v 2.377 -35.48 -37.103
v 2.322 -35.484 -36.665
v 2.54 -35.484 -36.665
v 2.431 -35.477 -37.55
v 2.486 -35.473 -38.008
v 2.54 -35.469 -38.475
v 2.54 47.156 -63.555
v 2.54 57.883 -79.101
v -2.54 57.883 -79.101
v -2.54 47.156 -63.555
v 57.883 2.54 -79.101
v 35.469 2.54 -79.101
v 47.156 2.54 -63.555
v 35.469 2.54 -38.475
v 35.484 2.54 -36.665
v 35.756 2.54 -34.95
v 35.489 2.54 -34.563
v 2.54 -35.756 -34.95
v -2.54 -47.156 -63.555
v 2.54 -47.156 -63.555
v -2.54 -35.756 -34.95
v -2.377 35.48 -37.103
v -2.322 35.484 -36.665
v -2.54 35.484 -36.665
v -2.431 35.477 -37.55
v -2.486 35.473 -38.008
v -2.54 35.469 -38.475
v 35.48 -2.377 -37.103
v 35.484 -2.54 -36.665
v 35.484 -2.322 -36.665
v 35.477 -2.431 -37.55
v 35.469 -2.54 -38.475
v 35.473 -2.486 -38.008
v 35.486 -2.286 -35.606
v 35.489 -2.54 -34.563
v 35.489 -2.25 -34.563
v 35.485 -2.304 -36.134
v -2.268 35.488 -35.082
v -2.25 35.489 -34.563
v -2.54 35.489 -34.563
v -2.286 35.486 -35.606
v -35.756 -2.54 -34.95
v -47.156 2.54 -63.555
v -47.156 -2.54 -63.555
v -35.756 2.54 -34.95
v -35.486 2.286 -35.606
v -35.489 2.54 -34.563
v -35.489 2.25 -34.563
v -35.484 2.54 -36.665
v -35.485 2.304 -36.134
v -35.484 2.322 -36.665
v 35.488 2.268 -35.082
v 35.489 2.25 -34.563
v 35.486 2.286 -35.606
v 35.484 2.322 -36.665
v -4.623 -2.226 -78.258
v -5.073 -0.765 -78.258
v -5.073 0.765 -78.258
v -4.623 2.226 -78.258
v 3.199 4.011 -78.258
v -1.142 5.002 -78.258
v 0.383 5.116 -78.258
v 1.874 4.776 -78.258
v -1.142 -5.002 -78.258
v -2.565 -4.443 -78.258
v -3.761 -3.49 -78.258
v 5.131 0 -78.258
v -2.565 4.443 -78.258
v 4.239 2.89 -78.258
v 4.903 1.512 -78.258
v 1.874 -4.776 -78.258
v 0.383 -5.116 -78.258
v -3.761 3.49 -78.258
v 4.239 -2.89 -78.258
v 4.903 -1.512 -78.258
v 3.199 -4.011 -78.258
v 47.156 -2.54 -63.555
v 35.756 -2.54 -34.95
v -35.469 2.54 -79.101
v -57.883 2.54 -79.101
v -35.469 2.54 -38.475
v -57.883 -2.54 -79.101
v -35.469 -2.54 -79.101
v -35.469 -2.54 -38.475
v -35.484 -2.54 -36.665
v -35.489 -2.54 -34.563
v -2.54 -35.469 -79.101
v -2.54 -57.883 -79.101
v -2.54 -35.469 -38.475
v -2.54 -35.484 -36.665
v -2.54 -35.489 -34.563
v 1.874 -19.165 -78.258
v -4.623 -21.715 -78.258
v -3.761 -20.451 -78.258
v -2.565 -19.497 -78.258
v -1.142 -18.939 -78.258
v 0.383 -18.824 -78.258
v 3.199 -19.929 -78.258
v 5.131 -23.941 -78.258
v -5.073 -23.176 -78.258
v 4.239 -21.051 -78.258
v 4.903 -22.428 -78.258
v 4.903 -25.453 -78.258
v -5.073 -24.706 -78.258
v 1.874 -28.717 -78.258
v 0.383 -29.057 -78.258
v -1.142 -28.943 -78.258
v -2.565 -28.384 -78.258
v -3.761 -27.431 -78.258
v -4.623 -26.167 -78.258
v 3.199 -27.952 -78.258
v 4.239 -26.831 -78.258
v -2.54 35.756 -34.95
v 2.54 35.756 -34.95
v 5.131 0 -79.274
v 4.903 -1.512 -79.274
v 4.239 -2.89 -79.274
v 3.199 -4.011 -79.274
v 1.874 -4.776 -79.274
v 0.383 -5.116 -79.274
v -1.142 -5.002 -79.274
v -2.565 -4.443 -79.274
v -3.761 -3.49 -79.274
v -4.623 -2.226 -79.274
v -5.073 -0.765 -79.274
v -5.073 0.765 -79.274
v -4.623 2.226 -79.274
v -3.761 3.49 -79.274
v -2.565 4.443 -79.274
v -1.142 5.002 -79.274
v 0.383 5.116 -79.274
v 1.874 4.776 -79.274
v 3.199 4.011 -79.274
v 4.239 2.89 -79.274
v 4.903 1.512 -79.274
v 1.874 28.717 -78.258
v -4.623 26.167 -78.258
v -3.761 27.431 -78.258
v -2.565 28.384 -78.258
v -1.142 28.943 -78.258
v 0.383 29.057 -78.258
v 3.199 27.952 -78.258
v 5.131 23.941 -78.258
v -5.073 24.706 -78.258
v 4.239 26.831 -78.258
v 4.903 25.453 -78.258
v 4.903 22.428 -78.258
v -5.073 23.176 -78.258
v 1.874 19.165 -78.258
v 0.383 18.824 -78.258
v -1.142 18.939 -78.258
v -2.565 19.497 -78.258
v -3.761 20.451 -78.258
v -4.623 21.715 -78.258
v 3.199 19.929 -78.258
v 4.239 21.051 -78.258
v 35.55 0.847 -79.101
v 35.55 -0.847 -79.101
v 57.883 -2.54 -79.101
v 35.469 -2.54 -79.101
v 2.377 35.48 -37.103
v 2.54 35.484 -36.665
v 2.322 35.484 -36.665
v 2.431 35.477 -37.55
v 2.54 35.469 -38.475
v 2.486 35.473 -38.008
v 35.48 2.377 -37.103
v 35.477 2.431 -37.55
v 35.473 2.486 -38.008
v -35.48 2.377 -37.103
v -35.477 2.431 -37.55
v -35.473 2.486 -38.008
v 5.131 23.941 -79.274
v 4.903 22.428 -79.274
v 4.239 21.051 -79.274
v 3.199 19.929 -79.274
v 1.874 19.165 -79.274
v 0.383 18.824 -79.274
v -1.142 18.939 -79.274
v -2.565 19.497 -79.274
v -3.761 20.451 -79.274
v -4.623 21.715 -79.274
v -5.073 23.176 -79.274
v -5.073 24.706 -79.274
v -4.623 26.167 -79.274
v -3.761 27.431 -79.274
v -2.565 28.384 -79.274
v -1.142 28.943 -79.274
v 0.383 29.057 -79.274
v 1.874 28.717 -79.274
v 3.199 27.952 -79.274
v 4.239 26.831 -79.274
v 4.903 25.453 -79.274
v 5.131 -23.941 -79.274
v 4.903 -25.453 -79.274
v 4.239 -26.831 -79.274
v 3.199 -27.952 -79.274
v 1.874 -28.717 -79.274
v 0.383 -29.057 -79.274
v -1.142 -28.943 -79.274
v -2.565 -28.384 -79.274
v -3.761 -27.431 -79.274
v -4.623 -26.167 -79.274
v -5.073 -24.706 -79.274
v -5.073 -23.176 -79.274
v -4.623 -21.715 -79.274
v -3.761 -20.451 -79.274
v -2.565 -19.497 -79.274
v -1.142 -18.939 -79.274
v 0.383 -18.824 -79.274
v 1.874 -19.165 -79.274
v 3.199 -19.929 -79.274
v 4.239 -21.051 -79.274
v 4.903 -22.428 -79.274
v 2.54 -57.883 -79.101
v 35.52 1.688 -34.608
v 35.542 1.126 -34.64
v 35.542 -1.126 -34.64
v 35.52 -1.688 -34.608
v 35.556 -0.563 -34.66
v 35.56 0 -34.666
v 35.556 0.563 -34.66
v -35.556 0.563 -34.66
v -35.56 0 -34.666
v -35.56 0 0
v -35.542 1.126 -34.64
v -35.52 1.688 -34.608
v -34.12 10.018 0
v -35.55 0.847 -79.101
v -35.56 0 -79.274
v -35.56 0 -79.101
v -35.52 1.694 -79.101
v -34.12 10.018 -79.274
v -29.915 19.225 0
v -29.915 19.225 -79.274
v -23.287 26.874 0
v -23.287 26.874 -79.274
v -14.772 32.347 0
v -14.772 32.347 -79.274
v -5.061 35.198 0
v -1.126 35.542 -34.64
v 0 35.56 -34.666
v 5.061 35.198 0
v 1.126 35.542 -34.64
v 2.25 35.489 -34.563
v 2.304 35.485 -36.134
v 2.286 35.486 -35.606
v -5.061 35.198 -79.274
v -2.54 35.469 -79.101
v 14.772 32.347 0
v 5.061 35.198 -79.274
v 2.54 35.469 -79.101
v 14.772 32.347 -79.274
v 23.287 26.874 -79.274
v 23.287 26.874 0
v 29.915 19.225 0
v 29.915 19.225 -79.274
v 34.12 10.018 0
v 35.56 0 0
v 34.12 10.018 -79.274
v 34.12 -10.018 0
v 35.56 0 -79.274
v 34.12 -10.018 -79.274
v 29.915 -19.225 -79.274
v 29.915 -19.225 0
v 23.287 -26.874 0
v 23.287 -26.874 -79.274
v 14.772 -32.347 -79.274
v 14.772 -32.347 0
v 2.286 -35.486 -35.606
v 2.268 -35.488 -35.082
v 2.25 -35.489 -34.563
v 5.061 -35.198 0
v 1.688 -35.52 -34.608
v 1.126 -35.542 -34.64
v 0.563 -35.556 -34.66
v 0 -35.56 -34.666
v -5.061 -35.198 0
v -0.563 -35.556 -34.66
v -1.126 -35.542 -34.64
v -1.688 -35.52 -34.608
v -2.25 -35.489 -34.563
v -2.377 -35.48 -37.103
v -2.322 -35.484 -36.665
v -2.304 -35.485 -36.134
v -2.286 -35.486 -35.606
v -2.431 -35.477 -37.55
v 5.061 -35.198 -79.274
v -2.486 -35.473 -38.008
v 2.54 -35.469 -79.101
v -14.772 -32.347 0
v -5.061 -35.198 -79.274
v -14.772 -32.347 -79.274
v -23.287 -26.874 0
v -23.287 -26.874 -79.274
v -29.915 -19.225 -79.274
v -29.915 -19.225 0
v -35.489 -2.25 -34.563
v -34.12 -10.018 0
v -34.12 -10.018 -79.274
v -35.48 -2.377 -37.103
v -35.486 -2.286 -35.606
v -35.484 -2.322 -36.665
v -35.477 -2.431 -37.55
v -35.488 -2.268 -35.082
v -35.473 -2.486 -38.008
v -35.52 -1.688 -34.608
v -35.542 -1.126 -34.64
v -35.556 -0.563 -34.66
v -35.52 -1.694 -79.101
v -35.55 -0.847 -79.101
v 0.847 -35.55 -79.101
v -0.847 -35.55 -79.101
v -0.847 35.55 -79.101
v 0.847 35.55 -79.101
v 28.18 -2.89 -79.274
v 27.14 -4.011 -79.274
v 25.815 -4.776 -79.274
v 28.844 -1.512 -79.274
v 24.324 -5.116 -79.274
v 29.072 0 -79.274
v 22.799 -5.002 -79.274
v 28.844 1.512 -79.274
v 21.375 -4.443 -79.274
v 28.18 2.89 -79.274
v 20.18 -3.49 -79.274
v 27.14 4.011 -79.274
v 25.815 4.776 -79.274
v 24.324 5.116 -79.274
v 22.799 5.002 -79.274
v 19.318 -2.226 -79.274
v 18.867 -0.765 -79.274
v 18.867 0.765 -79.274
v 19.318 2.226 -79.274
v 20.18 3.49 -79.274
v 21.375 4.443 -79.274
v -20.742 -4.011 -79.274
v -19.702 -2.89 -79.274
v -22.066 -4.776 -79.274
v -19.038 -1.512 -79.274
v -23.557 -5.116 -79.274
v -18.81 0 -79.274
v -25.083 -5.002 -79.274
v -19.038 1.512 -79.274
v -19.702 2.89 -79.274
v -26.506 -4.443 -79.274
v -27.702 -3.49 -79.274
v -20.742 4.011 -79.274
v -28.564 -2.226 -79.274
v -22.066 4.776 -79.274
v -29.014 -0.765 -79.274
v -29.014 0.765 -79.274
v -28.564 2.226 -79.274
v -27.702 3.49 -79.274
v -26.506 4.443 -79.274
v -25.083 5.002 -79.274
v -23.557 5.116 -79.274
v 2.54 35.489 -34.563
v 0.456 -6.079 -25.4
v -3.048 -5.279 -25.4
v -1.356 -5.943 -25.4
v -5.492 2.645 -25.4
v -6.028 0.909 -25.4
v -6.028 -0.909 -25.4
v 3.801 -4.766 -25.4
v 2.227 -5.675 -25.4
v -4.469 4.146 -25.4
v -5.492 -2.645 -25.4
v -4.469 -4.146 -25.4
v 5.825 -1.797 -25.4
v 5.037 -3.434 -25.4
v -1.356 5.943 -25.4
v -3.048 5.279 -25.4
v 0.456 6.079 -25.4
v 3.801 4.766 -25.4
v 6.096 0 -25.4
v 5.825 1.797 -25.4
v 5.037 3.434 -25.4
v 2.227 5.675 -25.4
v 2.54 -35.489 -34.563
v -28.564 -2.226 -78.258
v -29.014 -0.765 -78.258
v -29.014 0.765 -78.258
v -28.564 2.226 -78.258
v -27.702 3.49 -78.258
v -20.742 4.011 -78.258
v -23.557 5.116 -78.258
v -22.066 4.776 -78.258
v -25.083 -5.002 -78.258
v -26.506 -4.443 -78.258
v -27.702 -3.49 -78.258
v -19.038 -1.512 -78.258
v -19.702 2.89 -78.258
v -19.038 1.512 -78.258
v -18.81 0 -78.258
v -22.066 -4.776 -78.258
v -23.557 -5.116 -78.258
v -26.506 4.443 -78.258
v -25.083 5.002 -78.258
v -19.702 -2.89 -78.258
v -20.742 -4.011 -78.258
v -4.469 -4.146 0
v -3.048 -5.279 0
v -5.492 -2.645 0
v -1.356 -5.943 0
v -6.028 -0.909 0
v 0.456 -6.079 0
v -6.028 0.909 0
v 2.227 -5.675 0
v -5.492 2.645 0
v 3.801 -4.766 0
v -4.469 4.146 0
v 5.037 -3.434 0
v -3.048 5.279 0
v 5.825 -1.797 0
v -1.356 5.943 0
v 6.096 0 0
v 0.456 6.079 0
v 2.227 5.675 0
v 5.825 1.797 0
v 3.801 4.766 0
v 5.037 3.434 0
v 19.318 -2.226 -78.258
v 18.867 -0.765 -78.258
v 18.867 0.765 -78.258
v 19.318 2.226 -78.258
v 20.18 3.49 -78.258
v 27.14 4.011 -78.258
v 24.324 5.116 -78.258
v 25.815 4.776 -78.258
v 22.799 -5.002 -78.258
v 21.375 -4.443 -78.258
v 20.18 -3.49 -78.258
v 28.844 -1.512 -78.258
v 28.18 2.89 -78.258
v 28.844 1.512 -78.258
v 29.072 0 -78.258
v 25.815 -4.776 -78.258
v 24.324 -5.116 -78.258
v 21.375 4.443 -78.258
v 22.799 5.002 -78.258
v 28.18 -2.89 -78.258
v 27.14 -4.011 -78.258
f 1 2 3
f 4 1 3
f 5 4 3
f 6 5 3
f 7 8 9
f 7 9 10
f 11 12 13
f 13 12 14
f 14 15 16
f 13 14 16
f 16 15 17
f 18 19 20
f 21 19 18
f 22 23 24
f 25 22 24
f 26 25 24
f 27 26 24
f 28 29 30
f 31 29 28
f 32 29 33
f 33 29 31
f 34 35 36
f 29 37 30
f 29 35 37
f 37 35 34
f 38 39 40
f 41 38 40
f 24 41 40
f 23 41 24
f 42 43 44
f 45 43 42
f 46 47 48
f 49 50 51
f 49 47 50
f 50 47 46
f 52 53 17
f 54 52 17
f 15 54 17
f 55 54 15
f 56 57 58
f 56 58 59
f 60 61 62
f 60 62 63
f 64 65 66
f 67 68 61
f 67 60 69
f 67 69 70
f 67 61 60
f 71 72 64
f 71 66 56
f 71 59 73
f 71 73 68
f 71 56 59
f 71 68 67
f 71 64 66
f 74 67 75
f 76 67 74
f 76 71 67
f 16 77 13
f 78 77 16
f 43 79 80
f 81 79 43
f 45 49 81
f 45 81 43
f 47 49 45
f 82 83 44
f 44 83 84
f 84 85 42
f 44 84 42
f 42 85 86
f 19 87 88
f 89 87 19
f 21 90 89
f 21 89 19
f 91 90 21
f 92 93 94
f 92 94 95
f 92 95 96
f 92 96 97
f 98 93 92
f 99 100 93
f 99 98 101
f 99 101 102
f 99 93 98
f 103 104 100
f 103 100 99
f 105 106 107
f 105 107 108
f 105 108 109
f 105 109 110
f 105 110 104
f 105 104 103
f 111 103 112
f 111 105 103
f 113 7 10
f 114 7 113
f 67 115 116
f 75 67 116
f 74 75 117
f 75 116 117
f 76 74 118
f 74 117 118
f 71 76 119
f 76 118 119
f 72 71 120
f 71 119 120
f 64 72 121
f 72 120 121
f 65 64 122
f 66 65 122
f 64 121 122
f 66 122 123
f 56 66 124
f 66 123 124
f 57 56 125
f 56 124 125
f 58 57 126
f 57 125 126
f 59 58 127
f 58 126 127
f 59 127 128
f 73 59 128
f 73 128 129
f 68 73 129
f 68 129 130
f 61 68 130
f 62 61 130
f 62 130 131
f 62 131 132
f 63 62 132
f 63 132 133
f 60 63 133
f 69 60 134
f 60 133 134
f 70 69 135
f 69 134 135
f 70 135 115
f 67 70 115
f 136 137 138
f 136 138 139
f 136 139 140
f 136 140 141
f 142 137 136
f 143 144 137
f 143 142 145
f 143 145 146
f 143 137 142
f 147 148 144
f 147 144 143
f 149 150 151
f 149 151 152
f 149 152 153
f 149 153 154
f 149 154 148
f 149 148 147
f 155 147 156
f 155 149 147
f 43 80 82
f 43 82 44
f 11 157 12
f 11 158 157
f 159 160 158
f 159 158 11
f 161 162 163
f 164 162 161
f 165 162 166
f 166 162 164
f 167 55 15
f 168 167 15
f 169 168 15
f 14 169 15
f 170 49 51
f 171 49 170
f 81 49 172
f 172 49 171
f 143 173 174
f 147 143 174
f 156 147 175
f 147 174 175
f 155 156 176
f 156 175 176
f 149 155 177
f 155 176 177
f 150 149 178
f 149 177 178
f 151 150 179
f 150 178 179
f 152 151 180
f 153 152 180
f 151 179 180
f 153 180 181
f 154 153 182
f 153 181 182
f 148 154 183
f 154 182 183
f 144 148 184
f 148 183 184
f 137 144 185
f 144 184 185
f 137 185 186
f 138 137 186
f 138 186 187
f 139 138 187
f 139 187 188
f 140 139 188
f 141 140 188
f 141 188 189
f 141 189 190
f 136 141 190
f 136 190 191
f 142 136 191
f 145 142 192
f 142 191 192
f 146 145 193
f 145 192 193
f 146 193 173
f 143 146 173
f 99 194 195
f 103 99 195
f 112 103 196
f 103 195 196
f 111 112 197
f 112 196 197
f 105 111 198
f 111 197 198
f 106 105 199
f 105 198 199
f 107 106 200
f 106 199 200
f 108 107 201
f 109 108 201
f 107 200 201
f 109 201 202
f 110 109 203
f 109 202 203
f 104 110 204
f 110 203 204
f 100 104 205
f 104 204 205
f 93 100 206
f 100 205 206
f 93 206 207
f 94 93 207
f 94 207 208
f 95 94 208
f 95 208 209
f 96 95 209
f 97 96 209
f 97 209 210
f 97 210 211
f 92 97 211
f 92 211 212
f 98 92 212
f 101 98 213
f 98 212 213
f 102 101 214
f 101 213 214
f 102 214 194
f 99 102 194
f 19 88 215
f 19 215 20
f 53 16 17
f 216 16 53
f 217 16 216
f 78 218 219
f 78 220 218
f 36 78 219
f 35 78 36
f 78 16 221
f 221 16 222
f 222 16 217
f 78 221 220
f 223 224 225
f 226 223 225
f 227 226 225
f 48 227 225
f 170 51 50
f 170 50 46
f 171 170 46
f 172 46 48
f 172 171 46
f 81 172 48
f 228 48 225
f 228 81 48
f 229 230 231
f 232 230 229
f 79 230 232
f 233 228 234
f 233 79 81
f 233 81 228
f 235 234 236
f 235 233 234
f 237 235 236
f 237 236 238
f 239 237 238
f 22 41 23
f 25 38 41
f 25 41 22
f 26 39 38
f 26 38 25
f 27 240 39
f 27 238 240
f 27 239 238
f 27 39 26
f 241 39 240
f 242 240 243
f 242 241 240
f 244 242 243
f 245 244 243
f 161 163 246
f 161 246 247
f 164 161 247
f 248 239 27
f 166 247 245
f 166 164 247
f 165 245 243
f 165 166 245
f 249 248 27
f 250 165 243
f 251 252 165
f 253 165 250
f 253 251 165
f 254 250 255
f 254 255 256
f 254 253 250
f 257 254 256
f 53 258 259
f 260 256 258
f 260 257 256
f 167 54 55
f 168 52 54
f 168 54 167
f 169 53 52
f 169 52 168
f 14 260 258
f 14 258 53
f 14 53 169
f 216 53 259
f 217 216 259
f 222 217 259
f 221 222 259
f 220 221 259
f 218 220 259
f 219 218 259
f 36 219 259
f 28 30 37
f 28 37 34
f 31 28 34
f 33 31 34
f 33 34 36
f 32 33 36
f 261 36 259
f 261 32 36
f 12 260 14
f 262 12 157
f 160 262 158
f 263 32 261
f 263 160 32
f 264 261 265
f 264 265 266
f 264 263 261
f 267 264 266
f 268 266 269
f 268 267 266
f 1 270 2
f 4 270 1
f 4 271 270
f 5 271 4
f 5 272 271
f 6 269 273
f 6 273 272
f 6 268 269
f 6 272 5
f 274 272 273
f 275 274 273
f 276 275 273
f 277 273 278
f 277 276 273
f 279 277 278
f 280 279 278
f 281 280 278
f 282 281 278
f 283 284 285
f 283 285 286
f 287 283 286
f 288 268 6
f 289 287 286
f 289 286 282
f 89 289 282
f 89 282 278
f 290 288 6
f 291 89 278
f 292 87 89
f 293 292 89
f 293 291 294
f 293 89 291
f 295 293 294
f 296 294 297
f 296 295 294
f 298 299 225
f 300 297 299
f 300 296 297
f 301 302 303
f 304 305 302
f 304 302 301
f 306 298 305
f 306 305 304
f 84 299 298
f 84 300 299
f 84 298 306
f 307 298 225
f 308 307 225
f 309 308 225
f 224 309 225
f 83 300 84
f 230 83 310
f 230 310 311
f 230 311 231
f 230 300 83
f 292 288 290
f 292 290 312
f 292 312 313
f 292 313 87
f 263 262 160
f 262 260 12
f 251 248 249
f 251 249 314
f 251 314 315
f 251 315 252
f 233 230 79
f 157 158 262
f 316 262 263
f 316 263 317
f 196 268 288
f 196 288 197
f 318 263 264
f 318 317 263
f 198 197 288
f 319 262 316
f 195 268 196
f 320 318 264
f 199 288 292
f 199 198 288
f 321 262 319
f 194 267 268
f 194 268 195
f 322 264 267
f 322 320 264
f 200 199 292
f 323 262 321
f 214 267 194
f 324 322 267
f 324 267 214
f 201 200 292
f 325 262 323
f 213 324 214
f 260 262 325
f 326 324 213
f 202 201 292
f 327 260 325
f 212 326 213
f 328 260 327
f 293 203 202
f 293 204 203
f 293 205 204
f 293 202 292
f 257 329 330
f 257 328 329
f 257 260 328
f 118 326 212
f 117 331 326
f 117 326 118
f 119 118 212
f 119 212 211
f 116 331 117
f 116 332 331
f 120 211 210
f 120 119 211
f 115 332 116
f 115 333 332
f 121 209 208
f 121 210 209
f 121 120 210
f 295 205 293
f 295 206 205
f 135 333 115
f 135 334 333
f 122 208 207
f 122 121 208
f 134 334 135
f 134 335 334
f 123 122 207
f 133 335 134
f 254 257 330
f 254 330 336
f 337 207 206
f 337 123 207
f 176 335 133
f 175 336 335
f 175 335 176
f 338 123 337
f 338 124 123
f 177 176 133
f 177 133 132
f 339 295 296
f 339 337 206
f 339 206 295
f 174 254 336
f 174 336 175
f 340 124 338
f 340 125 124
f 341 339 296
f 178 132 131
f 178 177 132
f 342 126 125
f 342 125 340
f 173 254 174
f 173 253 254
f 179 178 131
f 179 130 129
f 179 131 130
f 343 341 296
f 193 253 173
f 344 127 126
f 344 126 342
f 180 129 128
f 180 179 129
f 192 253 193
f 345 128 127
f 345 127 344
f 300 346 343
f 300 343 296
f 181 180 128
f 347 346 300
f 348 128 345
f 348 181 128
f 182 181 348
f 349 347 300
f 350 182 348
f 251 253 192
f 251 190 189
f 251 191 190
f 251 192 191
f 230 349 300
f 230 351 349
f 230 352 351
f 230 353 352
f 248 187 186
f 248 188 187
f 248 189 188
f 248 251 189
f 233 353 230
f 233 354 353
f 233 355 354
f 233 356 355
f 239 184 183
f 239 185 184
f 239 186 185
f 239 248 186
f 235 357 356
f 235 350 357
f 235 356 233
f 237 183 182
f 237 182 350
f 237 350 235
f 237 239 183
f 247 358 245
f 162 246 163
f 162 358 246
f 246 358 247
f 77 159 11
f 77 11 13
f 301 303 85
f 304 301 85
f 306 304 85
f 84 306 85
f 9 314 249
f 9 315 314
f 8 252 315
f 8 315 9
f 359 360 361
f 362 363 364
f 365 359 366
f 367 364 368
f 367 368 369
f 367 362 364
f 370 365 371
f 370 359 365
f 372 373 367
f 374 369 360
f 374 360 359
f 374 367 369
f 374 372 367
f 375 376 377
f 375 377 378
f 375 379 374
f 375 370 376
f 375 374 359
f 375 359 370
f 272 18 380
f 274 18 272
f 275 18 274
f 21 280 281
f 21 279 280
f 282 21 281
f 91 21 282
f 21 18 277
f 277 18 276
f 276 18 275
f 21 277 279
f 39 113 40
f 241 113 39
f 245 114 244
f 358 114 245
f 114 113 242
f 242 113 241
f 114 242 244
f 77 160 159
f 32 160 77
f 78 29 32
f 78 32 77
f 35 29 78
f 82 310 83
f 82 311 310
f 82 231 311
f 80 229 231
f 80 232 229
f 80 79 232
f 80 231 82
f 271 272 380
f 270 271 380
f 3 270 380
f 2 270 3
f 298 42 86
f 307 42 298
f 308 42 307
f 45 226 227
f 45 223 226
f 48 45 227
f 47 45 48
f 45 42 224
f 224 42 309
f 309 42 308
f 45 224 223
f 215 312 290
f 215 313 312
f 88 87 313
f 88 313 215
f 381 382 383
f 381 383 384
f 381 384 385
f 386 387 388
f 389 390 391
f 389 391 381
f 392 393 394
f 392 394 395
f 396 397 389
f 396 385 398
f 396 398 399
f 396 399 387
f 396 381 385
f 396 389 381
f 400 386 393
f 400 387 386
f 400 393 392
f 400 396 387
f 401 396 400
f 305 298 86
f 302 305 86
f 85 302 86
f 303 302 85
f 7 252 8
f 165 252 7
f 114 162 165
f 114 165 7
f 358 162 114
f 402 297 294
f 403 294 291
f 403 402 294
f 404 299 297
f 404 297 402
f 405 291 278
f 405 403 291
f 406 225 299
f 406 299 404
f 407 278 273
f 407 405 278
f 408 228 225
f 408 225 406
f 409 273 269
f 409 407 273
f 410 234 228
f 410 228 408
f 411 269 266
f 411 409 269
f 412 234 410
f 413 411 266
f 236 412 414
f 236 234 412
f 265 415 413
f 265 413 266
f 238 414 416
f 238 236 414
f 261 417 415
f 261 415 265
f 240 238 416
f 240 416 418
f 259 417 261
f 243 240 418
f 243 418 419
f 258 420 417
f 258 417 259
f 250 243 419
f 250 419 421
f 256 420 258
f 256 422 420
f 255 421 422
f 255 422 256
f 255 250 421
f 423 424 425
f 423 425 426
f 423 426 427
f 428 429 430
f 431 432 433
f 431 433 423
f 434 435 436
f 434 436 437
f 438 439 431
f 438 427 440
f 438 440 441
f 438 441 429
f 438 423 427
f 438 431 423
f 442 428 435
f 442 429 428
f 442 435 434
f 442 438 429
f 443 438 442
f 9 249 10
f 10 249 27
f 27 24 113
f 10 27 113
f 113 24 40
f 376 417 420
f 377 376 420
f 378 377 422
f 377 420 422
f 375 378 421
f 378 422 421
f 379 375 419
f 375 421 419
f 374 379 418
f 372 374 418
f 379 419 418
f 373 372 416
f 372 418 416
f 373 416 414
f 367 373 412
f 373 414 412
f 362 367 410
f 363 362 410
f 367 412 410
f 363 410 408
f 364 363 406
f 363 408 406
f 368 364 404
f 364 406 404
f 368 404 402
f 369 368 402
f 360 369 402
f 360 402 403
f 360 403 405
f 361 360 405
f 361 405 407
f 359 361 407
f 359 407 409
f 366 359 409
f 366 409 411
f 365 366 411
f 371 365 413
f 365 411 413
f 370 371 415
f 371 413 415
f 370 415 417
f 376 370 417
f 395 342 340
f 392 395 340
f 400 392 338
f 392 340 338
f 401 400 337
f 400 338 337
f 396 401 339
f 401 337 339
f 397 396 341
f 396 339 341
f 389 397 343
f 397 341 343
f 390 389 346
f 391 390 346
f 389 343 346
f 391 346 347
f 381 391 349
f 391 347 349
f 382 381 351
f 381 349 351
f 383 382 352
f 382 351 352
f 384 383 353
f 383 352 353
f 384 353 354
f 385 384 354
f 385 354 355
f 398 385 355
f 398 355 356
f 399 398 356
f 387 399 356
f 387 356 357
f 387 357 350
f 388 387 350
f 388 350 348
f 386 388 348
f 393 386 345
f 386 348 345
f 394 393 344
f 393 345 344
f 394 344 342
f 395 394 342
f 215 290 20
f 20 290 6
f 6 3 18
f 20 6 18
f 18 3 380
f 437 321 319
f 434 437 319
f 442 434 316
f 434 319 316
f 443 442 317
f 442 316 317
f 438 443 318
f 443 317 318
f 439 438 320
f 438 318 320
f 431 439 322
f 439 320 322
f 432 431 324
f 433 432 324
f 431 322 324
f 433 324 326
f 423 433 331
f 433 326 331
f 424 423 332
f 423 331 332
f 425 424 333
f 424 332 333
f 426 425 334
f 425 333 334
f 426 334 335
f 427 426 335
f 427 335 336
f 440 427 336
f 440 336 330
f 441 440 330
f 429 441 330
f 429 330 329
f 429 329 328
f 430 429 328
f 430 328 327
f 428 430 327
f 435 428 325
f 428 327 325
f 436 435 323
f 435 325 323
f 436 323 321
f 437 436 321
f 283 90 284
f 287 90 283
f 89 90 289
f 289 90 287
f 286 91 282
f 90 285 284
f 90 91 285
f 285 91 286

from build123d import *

# Parameters (mm, degrees)
F0_W     = 3.4201149829
F0_H     = 19.8584441096
F0_W_2   = 2.4988718903
F0_W_3   = 1.865520142
F0_W_4   = 2.0727999508
F0_W_5   = 2.0727985539
F0_W_6   = 2.0727962255
F0_W_7   = 2.4873549119
F0_W_8   = 2.9019191861
F0_W_9   = 2.4873595685
F0_W_10  = 2.2800769657
F0_W_11  = 2.9019173235
F0_W_12  = 2.5449345174
F0_W_13  = 1.6582384706
F0_W_14  = 2.0152203453
F3_DEPTH = 2.54
F4_COUNT = 4
F5_R     = 5.1308
F6_DEPTH = 1.016
F7_R     = 6.096
F8_DEPTH = 25.4


with BuildPart() as f1:
    # F0 (on Front) → F1 (revolve)
    with BuildSketch(Plane.XZ):
        Polygon((-35.56, -79.2744270182), (0, -79.2744270182), (0, -19.8584441096), (-3.4201149829, -19.8584441096), (-5.2856351249, -19.8584441096), (-7.3584336787, -19.8584441096), (-9.8457885906, -19.8584441096), (-12.3331481591, -19.8584441096), (-15.2350654826, -19.8584441096), (-17.78, -19.8584441096), (-19.7952203453, -19.8584441096), (-21.4534588158, -19.8584441096), (-23.7335357815, -19.8584441096), (-26.0136127472, -19.8584441096), (-28.9155319333, -19.8584441096), (-30.9883281589, -19.8584441096), (-33.0611281097, -19.8584441096), (-35.56, -19.8584441096), align=None)
        with Locations((-1.7100574914, -9.9292220548)):
            Rectangle(F0_W, F0_H)
        with Locations((-34.3105640548, -9.9292220548)):
            Rectangle(F0_W_2, F0_H)
        with Locations((-4.3528750539, -9.9292220548)):
            Rectangle(F0_W_3, F0_H)
        with Locations((-32.0247281343, -9.9292220548)):
            Rectangle(F0_W_4, F0_H)
        with Locations((-6.3220344018, -9.9292220548)):
            Rectangle(F0_W_5, F0_H)
        with Locations((-29.9519300461, -9.9292220548)):
            Rectangle(F0_W_6, F0_H)
        with Locations((-8.6021111347, -9.9292220548)):
            Rectangle(F0_W_7, F0_H)
        with Locations((-27.4645723403, -9.9292220548)):
            Rectangle(F0_W_8, F0_H)
        with Locations((-11.0894683748, -9.9292220548)):
            Rectangle(F0_W_9, F0_H)
        with Locations((-24.8735742643, -9.9292220548)):
            Rectangle(F0_W_10, F0_H)
        with Locations((-13.7841068208, -9.9292220548)):
            Rectangle(F0_W_11, F0_H)
        with Locations((-22.5934972987, -9.9292220548)):
            Rectangle(F0_W_10, F0_H)
        with Locations((-16.5075327413, -9.9292220548)):
            Rectangle(F0_W_12, F0_H)
        with Locations((-20.6243395805, -9.9292220548)):
            Rectangle(F0_W_13, F0_H)
        with Locations((-18.7876101726, -9.9292220548)):
            Rectangle(F0_W_14, F0_H)
    revolve(axis=Axis((0, 0, -38.7951713055), (0, 0, -1)))

    # F2 (on Front) → F3 (join, symmetric)
    with BuildSketch(Plane.XZ):
        Polygon((35.4841057915, -36.6654805839), (35.1339280605, -79.1006311774), (47.1561551094, -79.1006311774), (47.1561551094, -63.5546445847), (35.755764693, -34.9500365555), (35.4887494468, -34.563057843), align=None)
        Polygon((47.1561551094, -63.5546445847), (47.1561551094, -79.1006311774), (57.8828832321, -79.1006311774), align=None)
    extrude(amount=F3_DEPTH, both=True)

    # F4: F1 ×4 about axis
    f4_axis = Axis((0, 0, -38.7951713055), (0, 0, -1))


with BuildPart() as f1_1:
    add(f1.part)
    for i in range(1, F4_COUNT):
        add(f1.part.rotate(f4_axis, i * 360 / F4_COUNT))

    # F5 (on face) → F6 (cut)
    with BuildSketch(Plane(origin=(0, 0, -79.2744270182), x_dir=(1, 0, 0), z_dir=(0, 0, -1))):
        Circle(F5_R)
        with Locations((-23.9408165216, 0)):
            Circle(F5_R)
        with Locations((0, 23.9408165216)):
            Circle(F5_R)
        with Locations((23.9408165216, 0)):
            Circle(F5_R)
        with Locations((0, -23.9408165216)):
            Circle(F5_R)
    extrude(amount=-F6_DEPTH, mode=Mode.SUBTRACT)

    # F7 (on Top) → F8 (cut)
    with BuildSketch(Plane.XY):
        Circle(F7_R)
    extrude(amount=-F8_DEPTH, mode=Mode.SUBTRACT)


solid = f1_1.part
